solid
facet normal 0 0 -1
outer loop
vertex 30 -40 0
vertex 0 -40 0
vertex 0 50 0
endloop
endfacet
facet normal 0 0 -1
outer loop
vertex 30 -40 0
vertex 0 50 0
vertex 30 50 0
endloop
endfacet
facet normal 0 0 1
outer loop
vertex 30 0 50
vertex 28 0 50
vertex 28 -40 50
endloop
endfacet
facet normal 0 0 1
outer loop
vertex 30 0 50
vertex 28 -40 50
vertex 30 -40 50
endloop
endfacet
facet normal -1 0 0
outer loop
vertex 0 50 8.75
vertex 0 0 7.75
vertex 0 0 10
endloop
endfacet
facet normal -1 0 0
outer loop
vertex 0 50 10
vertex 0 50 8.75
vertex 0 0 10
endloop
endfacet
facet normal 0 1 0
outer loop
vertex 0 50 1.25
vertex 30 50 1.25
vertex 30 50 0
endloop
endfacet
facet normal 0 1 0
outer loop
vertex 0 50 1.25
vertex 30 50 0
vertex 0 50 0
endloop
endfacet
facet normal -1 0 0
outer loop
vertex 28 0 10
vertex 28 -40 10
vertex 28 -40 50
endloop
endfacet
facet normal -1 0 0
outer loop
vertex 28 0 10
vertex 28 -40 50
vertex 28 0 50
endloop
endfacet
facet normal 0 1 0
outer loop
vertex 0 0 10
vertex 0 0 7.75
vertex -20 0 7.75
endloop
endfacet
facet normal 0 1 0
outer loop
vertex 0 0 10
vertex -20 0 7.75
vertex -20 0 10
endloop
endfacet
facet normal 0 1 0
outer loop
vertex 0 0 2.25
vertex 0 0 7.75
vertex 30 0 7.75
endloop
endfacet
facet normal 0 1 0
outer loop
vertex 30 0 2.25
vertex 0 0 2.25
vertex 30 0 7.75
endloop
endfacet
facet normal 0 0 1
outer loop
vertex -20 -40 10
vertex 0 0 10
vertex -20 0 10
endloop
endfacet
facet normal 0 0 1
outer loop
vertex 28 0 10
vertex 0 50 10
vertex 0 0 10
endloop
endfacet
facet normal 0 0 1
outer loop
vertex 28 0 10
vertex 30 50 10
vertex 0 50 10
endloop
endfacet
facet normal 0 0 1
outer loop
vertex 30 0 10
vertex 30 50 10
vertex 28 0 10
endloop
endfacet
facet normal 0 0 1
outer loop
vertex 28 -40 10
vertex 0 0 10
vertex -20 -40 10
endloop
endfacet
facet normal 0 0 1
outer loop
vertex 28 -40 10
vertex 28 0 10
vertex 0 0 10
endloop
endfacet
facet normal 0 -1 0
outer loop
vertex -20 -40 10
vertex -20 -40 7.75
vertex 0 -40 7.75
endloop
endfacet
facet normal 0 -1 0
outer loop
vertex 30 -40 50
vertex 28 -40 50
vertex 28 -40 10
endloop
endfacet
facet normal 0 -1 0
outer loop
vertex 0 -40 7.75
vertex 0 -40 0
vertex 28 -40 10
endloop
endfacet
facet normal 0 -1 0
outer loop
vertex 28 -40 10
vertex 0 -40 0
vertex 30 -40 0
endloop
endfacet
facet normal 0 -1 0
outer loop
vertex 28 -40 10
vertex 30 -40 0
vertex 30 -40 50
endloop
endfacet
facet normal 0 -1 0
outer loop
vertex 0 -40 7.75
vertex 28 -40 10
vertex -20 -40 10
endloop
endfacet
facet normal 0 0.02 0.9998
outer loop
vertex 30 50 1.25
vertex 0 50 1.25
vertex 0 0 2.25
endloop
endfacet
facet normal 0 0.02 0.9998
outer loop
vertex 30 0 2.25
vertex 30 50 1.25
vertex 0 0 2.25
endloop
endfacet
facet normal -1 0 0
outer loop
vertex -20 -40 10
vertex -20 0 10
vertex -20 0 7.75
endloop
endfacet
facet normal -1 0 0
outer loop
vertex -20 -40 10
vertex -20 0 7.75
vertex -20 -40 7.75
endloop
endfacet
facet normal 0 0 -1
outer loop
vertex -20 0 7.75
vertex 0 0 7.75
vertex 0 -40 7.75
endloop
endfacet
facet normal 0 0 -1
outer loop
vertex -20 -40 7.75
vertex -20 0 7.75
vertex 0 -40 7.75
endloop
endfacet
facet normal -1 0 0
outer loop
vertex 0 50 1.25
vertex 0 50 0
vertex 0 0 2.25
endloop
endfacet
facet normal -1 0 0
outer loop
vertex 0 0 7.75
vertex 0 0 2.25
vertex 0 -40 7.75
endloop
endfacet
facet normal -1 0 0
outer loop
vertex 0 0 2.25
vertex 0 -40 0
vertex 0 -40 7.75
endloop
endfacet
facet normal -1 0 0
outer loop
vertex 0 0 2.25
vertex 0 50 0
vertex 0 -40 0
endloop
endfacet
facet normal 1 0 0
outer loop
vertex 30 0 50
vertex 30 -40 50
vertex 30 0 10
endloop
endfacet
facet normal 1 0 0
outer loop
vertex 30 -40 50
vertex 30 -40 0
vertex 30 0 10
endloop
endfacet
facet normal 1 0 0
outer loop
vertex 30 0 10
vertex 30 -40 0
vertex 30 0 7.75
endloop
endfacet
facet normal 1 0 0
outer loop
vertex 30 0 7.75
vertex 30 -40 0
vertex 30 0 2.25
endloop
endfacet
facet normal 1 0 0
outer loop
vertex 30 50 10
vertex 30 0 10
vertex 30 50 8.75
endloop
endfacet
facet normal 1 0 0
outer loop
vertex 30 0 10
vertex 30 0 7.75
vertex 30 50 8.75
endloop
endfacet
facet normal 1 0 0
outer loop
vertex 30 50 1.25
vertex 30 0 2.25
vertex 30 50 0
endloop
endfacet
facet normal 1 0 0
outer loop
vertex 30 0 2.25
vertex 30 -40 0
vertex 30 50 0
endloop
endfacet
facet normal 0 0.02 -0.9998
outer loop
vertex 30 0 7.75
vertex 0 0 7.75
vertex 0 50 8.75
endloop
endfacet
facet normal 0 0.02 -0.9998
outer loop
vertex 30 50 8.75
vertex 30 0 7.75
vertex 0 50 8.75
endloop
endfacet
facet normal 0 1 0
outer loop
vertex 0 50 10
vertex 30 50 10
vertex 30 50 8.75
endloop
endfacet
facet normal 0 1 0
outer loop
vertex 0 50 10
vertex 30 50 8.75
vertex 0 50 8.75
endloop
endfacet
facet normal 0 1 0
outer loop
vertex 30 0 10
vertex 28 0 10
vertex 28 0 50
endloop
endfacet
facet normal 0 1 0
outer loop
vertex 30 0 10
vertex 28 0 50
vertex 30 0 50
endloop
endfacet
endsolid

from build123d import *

# Parameters (mm, degrees)
F0_W     = 30
F0_H     = 10
F1_DEPTH = 40
F2_W     = 30
F2_H     = 2.25
F3_DEPTH = 50
F5_DEPTH = 30
F6_W     = 40
F6_H     = 2.25
F7_DEPTH = 20
F8_W     = 2
F8_H     = 40
F9_DEPTH = 40


with BuildPart() as f1:
    # F0 (on Front) → F1 (new body)
    with BuildSketch(Plane.XZ):
        with Locations((15, 5)):
            Rectangle(F0_W, F0_H)
    extrude(amount=F1_DEPTH)

    # F2 (on face) → F3 (join)
    with BuildSketch(Plane(origin=(0, 0, 0), x_dir=(-1, 0, 0), z_dir=(0, 1, 0))):
        with Locations((-15, 8.875)):
            Rectangle(F2_W, F2_H)
        with Locations((-15, 1.125)):
            Rectangle(F2_W, F2_H)
    extrude(amount=F3_DEPTH)

    # F4 (on face) → F5 (cut, through all)
    with BuildSketch(Plane(origin=(0, 0, 0), x_dir=(0, -1, 0), z_dir=(-1, 0, 0))):
        Polygon((-50, 7.75), (0, 7.75), (-50, 8.75), align=None)
        Polygon((-50, 1.25), (0, 2.25), (-50, 2.25), align=None)
    extrude(amount=-F5_DEPTH, mode=Mode.SUBTRACT)

    # F6 (on face) → F7 (join)
    with BuildSketch(Plane(origin=(0, 0, 0), x_dir=(0, -1, 0), z_dir=(-1, 0, 0))):
        with Locations((20, 8.875)):
            Rectangle(F6_W, F6_H)
    extrude(amount=F7_DEPTH)

    # F8 (on face) → F9 (join)
    with BuildSketch(Plane.XY.offset(10)):
        with Locations((29, -20)):
            Rectangle(F8_W, F8_H)
    extrude(amount=F9_DEPTH)


solid = f1.part
